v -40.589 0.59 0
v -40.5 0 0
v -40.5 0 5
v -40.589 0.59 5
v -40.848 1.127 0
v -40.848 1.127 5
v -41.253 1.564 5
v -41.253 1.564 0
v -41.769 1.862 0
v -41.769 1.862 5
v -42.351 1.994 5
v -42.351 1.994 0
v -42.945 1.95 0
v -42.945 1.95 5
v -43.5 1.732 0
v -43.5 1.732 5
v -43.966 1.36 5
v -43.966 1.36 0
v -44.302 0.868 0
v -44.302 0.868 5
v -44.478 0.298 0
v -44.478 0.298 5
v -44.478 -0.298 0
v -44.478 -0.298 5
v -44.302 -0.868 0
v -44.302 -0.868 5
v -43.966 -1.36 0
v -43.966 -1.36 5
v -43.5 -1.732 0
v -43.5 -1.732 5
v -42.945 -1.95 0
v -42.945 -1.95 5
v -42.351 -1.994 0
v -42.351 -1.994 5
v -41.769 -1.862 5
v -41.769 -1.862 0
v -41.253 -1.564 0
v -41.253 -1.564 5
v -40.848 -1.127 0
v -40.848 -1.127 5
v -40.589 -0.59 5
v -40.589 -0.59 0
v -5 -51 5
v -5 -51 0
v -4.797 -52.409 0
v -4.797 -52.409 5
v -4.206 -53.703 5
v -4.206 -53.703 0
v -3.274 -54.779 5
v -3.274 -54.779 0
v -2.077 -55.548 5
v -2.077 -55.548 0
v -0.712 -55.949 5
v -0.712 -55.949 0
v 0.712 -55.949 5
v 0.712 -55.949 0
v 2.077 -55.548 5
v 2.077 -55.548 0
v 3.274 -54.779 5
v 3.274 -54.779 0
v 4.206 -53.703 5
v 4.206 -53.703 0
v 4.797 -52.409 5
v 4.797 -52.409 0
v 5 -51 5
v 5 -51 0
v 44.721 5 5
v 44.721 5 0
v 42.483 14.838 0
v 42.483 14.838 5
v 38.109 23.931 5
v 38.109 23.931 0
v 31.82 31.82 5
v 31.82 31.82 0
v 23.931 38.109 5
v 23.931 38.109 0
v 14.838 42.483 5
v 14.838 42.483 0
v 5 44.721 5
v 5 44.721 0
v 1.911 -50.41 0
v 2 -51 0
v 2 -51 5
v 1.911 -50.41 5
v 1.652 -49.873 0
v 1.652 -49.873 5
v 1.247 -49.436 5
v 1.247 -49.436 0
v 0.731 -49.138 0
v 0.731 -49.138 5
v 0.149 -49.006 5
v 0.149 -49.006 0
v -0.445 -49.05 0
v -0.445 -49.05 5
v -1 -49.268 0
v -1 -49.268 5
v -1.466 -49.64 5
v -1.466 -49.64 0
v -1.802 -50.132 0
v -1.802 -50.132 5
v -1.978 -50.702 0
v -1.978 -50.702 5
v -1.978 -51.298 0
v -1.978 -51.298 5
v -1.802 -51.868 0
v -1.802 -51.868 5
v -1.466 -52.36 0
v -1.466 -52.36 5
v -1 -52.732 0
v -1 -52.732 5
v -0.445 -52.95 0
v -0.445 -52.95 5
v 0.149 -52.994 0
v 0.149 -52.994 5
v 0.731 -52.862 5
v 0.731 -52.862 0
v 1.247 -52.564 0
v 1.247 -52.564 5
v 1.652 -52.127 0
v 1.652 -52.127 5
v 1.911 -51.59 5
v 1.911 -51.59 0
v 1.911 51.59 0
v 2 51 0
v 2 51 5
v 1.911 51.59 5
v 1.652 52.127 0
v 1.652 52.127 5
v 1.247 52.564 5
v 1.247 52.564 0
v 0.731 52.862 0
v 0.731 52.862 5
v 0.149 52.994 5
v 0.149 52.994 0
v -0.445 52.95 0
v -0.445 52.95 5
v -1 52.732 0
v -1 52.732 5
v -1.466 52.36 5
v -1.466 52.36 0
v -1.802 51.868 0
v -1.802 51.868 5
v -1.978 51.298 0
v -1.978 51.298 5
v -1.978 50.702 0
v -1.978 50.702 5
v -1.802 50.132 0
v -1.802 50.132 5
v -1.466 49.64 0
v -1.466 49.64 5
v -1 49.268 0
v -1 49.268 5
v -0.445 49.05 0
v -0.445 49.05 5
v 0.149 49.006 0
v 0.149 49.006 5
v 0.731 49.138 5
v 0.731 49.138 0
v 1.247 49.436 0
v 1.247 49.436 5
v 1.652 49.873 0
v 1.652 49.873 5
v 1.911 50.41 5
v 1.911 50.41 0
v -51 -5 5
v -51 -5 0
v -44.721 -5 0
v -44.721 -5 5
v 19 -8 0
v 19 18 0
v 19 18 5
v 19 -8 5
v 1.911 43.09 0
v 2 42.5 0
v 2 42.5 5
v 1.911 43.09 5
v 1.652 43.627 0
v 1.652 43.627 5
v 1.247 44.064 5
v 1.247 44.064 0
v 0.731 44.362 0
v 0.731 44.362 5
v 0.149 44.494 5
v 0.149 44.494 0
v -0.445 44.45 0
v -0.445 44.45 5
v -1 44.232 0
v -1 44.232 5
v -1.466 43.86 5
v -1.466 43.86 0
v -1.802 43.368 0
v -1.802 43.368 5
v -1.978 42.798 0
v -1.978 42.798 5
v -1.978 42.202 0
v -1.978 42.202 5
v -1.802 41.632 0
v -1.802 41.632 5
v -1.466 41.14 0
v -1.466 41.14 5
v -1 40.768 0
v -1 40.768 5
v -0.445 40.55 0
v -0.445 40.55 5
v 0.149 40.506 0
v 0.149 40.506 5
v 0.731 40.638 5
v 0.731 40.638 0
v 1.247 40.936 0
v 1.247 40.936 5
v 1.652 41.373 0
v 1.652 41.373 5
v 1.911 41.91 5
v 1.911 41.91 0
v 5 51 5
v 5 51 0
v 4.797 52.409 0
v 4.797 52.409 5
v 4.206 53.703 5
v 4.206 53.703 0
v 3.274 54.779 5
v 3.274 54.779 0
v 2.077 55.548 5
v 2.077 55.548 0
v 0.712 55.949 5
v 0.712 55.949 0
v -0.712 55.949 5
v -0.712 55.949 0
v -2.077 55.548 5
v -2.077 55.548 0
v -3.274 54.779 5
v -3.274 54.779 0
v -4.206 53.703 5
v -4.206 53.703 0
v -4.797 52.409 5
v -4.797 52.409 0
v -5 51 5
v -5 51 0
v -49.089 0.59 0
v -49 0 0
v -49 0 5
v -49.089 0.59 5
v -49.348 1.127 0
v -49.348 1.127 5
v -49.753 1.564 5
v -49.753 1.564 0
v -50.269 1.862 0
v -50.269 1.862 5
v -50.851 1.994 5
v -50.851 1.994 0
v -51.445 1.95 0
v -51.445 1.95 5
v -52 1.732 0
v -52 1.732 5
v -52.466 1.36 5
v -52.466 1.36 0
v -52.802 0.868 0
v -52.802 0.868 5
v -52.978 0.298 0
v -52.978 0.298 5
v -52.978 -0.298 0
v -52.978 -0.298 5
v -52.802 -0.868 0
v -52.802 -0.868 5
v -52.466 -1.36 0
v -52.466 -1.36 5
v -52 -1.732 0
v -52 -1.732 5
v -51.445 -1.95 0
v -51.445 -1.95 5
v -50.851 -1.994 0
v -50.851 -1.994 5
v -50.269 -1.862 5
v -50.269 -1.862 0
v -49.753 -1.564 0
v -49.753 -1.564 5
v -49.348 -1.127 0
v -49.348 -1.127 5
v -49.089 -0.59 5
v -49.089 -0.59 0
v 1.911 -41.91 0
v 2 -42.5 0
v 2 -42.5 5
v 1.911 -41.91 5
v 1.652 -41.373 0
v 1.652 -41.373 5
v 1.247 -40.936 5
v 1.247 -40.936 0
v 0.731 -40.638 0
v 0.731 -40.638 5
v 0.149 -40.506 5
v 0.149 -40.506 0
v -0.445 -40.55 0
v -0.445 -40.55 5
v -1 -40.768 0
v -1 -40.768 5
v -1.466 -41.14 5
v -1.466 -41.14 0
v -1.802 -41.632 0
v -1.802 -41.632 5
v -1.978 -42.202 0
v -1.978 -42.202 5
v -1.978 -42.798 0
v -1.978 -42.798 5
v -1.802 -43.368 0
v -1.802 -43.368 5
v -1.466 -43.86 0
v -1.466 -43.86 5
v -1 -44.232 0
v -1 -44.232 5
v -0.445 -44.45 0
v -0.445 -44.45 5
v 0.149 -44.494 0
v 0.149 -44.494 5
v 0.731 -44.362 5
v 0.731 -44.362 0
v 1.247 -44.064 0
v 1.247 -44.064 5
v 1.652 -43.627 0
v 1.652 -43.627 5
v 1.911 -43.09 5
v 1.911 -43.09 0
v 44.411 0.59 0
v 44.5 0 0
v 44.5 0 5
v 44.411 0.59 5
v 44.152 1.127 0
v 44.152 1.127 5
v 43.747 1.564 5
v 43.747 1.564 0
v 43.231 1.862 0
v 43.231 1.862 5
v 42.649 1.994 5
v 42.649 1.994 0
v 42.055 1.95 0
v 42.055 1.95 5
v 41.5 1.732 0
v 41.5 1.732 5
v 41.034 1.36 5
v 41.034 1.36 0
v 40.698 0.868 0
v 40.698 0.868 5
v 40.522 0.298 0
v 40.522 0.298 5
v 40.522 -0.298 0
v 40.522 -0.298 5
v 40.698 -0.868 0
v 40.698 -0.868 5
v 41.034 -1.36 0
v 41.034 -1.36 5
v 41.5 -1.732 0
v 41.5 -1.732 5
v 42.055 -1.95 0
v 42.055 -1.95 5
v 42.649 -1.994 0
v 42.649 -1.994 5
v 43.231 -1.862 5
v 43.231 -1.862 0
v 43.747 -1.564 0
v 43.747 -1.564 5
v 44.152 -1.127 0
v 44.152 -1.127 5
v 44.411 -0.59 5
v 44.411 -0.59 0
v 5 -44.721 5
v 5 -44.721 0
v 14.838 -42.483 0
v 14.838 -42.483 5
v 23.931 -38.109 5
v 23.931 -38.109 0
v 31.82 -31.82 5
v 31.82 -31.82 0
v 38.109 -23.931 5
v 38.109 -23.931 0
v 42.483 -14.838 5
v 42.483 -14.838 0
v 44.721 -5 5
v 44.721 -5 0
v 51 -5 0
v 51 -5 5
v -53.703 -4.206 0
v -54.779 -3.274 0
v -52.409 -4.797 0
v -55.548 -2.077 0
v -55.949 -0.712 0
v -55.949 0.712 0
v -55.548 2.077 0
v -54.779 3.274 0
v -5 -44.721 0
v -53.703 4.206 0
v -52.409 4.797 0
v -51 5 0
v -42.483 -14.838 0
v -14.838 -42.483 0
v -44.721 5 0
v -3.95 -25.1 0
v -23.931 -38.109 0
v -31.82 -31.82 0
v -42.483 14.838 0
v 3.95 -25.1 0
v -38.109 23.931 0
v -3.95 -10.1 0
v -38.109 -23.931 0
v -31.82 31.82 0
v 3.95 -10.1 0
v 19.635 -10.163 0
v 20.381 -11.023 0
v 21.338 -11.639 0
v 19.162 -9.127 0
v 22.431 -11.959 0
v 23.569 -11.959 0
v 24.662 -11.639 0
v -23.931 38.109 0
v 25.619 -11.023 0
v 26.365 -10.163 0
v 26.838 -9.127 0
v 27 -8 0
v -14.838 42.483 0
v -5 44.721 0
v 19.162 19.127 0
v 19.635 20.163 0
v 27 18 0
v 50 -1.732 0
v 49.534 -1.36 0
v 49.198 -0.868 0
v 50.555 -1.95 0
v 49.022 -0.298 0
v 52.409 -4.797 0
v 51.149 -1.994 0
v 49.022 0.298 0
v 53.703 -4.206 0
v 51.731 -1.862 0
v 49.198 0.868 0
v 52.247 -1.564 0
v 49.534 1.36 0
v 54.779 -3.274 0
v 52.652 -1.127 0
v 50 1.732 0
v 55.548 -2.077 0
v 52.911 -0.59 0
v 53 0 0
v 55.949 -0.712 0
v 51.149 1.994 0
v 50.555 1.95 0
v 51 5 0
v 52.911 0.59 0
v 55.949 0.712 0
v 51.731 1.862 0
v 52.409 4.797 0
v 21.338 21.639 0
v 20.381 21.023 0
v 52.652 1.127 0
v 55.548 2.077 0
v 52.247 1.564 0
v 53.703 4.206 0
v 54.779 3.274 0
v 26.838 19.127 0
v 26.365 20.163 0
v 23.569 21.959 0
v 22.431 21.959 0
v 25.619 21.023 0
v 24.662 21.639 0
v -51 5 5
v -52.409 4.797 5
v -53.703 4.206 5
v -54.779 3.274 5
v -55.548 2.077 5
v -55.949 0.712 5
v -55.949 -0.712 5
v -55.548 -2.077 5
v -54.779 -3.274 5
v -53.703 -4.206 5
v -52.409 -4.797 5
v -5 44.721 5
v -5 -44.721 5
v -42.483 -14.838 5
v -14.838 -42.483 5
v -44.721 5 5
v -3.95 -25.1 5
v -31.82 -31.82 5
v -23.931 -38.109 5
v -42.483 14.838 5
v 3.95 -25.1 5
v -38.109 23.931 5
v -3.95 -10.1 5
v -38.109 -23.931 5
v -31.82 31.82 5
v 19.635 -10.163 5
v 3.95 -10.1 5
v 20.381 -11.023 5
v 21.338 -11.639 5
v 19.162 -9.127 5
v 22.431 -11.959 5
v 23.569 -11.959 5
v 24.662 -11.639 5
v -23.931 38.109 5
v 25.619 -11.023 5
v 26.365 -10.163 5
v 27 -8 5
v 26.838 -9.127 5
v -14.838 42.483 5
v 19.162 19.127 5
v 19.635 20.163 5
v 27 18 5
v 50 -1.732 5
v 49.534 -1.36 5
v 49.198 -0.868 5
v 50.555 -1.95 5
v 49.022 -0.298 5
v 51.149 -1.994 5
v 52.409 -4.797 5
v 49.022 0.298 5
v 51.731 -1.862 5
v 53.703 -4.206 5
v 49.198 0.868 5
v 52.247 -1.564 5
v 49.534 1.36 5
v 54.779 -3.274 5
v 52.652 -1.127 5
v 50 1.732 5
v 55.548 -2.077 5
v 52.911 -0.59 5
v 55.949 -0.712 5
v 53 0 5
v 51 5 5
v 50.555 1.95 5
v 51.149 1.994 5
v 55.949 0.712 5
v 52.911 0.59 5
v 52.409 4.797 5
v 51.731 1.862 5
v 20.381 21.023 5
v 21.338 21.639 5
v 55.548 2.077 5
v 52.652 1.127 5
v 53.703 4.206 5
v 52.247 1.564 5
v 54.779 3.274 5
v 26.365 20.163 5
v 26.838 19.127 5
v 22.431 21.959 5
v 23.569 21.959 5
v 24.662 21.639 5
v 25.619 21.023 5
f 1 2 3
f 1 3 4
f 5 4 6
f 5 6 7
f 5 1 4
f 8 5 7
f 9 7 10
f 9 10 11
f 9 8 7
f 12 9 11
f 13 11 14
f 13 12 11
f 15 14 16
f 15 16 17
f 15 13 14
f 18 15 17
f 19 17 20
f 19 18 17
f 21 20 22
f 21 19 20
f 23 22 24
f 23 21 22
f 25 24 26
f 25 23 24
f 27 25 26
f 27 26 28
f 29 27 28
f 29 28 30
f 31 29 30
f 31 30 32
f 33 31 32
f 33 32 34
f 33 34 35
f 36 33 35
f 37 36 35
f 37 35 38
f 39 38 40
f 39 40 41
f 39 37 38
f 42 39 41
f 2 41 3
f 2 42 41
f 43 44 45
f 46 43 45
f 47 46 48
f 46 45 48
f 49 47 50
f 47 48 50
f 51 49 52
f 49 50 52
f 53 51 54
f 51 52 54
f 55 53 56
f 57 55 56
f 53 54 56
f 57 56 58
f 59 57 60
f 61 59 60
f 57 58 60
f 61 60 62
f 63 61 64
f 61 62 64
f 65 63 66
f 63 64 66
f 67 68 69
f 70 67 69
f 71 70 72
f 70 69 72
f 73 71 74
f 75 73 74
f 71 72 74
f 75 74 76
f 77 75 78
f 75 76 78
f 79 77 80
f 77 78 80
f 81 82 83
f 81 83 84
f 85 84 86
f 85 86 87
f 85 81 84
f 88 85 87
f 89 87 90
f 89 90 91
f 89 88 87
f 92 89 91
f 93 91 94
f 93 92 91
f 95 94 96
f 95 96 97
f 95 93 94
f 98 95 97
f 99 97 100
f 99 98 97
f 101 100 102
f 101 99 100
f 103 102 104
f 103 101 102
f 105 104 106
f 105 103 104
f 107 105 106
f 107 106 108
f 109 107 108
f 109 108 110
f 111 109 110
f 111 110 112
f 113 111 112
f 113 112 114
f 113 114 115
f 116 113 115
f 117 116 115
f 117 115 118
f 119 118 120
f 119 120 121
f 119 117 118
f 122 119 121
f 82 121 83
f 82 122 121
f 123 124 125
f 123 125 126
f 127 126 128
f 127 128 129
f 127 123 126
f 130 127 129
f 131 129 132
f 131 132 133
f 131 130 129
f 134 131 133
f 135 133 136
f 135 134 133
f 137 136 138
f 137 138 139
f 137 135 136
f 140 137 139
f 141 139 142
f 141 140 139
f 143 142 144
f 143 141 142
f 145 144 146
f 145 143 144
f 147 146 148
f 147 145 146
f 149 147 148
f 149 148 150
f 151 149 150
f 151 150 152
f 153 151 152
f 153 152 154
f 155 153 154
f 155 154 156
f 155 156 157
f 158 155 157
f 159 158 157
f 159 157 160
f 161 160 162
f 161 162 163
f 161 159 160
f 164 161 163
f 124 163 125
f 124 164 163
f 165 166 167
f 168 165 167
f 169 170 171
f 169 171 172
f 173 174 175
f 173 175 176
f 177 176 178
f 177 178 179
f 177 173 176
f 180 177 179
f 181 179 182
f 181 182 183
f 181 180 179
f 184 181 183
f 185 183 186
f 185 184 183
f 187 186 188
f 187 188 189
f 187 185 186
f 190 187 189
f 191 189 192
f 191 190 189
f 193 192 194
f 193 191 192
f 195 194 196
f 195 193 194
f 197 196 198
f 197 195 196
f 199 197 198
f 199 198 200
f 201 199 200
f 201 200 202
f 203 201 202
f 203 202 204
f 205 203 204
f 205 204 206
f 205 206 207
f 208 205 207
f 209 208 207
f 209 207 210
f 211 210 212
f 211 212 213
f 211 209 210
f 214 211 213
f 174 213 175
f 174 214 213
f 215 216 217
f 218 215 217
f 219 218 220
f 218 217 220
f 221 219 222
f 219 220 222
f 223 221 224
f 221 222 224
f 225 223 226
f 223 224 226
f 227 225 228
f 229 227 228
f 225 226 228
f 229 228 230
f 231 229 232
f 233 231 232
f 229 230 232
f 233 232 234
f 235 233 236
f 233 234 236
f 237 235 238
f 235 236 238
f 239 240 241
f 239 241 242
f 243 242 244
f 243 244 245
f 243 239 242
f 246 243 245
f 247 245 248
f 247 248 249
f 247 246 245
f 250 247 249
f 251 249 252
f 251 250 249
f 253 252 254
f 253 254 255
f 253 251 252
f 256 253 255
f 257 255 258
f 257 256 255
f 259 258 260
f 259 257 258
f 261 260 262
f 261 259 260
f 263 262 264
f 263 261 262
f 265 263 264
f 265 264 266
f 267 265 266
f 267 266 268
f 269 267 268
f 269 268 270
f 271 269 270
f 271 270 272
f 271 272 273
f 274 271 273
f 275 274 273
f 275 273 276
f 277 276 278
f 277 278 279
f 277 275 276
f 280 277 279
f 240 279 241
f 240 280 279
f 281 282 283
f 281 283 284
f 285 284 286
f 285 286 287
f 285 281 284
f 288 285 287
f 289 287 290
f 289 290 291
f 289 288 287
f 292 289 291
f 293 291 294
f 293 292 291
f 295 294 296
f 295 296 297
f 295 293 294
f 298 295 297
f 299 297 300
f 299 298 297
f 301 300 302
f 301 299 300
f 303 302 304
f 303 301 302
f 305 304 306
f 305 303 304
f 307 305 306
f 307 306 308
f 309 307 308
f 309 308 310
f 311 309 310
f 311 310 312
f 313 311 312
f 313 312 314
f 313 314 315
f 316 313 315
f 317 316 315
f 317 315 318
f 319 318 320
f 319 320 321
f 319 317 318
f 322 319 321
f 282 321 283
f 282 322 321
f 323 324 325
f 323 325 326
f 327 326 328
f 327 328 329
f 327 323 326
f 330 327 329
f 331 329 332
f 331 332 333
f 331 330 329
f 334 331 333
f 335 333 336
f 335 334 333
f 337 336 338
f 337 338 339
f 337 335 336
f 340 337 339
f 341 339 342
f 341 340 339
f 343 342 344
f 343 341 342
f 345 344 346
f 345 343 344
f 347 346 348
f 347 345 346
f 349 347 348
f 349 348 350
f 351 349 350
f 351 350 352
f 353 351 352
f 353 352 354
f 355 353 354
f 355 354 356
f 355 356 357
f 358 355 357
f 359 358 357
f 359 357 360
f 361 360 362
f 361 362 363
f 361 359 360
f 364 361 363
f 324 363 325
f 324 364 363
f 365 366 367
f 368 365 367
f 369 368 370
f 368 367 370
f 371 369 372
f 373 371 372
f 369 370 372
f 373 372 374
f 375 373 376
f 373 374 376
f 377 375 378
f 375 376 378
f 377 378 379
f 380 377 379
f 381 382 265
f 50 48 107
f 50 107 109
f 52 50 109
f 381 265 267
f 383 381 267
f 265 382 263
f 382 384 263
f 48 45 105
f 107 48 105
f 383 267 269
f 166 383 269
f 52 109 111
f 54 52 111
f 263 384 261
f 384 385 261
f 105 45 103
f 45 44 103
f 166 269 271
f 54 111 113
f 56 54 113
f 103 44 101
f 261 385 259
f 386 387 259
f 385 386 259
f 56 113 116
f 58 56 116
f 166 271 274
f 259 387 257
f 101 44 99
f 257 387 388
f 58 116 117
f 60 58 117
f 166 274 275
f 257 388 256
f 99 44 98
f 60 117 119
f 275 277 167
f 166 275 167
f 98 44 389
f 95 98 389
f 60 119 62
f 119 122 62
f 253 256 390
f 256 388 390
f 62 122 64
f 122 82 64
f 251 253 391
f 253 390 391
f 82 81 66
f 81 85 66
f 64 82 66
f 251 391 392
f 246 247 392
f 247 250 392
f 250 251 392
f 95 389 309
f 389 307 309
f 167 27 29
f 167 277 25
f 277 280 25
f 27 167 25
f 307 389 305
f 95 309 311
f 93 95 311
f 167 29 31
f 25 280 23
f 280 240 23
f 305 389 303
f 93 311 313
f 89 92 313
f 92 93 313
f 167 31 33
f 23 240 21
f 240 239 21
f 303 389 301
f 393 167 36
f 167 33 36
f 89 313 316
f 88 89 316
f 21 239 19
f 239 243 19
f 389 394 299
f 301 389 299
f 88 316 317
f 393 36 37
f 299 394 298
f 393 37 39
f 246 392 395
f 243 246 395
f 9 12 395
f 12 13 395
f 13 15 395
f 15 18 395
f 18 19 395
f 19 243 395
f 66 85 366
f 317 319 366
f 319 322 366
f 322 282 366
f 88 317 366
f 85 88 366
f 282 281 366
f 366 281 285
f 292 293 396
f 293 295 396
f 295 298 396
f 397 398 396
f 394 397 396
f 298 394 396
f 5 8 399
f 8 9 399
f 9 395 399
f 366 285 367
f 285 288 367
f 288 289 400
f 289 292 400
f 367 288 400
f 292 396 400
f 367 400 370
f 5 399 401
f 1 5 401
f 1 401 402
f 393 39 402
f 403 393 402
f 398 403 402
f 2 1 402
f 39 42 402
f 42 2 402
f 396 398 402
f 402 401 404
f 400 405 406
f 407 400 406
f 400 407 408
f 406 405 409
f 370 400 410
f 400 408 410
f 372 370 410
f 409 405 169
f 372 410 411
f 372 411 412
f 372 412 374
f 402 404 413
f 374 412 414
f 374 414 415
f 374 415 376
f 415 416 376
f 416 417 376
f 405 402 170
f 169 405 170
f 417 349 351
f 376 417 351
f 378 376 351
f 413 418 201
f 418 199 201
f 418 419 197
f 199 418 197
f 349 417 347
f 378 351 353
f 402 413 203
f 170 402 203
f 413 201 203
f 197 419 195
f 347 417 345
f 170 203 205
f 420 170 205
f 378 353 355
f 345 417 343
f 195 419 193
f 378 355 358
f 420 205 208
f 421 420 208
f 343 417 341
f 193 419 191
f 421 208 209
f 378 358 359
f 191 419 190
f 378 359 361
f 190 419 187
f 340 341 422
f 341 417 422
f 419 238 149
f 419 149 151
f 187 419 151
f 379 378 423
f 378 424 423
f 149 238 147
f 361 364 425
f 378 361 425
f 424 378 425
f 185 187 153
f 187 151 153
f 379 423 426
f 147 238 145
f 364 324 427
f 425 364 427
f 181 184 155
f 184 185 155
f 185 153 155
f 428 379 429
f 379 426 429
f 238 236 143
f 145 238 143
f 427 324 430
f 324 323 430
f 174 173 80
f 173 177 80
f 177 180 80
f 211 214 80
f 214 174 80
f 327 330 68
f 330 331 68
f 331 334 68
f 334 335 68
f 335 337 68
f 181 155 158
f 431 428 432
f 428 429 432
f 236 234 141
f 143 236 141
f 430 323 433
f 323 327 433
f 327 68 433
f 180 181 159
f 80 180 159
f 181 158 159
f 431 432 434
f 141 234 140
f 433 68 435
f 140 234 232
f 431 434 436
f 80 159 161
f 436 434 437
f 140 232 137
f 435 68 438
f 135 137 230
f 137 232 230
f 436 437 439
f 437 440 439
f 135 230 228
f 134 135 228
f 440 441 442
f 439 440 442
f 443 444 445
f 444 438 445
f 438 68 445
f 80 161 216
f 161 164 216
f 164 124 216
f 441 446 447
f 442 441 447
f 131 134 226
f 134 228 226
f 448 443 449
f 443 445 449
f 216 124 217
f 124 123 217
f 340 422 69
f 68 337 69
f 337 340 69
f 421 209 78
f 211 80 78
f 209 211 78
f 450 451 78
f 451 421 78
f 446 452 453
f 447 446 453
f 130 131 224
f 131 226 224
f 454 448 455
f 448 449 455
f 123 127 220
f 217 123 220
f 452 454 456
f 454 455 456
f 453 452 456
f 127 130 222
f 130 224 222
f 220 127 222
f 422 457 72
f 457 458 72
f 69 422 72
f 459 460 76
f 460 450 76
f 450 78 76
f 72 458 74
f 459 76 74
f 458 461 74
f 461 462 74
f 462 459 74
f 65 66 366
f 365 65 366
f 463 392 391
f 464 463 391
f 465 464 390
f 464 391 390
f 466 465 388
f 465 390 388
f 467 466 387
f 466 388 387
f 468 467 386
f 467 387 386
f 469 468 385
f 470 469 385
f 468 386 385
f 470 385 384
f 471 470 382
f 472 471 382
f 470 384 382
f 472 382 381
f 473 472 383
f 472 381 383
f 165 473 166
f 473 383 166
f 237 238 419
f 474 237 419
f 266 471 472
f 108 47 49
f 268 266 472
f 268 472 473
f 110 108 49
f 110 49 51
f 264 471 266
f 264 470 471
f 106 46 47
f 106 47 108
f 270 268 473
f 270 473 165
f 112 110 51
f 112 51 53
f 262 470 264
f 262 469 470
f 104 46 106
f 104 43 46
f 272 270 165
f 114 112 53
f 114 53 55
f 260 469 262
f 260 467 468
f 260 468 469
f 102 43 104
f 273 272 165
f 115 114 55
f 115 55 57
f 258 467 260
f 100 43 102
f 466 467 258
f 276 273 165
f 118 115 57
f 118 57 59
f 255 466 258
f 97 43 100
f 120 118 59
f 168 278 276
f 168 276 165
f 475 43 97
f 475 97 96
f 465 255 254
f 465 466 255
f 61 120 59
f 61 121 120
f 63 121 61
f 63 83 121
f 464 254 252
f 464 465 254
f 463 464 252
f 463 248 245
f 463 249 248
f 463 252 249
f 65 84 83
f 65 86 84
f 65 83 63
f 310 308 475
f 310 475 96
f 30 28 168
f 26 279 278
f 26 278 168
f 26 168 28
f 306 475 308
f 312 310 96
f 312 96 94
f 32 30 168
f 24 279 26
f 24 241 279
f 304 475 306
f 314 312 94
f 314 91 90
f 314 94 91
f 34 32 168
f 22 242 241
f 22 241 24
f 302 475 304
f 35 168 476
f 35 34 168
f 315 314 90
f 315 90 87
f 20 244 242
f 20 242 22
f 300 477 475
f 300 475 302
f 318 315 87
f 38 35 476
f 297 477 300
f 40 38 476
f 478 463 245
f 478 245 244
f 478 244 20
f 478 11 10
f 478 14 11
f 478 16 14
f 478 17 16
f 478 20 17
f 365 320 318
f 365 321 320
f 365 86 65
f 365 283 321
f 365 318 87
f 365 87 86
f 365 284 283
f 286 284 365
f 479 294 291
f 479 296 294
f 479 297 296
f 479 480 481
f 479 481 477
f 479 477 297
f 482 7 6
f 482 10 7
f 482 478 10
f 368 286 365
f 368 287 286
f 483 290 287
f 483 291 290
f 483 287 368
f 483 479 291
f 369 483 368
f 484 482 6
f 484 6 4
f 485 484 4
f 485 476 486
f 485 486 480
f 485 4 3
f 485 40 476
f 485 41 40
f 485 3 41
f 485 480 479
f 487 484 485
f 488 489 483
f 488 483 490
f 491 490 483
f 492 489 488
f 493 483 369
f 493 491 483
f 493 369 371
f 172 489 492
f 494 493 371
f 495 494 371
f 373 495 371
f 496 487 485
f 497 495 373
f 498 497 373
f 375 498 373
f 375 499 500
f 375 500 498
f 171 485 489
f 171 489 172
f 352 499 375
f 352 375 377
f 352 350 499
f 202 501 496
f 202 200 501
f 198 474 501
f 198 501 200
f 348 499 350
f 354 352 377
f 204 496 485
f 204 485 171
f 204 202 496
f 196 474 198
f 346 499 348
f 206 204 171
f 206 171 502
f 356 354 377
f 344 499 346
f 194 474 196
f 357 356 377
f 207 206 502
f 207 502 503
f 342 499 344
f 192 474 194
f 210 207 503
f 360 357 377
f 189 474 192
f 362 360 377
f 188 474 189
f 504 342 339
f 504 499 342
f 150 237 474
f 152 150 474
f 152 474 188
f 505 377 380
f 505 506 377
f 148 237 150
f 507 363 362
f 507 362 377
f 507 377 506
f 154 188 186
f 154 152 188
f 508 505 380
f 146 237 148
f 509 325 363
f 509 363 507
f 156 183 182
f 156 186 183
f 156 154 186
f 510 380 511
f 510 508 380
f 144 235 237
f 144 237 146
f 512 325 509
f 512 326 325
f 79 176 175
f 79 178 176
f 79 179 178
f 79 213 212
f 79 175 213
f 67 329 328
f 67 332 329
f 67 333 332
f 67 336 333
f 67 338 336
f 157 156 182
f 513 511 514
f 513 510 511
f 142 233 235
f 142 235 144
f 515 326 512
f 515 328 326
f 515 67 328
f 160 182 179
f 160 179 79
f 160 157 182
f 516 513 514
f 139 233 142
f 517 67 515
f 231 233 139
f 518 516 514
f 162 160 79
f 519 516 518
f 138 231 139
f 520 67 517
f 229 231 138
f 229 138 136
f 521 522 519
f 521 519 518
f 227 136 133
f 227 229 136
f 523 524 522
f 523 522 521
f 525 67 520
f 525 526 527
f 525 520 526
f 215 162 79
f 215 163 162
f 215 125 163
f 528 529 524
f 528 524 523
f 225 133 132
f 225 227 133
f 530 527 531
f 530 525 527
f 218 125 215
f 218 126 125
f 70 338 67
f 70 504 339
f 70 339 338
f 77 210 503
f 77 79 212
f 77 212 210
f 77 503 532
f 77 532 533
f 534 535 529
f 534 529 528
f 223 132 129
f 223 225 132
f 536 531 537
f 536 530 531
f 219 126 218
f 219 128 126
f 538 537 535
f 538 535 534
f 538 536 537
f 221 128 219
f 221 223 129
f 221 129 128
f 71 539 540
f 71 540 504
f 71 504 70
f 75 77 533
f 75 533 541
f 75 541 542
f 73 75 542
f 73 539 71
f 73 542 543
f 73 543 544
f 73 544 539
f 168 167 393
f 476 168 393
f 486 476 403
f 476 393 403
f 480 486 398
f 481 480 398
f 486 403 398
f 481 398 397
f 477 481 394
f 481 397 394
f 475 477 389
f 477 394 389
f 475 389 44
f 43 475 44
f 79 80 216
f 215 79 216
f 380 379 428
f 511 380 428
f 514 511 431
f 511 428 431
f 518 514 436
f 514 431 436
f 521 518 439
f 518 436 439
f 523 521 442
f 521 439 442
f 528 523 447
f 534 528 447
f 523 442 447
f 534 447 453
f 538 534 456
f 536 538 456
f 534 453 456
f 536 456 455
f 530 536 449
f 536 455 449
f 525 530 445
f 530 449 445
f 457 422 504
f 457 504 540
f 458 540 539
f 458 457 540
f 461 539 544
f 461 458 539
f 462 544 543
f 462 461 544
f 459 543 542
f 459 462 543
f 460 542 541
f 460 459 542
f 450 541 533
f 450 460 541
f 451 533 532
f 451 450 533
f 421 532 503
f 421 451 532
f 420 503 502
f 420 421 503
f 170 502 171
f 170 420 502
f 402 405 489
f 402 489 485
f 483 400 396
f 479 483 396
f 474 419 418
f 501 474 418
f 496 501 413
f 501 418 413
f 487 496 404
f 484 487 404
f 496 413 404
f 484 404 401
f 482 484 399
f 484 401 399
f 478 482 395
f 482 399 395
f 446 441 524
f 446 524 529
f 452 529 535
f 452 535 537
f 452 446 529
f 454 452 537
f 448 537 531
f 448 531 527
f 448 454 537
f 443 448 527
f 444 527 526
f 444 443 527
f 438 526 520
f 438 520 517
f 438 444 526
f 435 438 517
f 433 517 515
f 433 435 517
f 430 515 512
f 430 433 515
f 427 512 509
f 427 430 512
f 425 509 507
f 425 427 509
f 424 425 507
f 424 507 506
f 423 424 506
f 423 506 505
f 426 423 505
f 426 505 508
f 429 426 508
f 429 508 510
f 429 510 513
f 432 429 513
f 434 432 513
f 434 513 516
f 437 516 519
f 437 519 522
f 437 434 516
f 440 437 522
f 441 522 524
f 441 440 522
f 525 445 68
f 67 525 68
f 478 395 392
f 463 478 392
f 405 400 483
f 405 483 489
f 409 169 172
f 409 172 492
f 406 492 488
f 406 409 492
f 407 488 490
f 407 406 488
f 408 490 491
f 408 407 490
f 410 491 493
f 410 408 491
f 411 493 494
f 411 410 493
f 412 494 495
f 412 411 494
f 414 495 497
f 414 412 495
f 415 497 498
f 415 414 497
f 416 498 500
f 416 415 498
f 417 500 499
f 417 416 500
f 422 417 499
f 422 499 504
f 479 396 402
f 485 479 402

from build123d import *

# Parameters (mm, degrees)
SKETCH1_R           = 2
BOSS_EXTRUDE1_DEPTH = 5
SKETCH2_W           = 7.9
SKETCH2_H           = 15
CUT_EXTRUDE1_DEPTH  = 10
CUT_EXTRUDE2_DEPTH  = 10


with BuildPart() as part:
    # Sketch1 → Boss-Extrude1 (new body)
    with BuildSketch(Plane.XY):
        with BuildLine():
            ThreePointArc((5, 51), (0, 56), (-5, 51))
            Line((-5, 51), (-5, 44.72135955))
            ThreePointArc((-5, 44.72135955), (-31.819805153, 31.819805153), (-44.72135955, 5))
            Line((-44.72135955, 5), (-51, 5))
            ThreePointArc((-51, 5), (-56, 0), (-51, -5))
            Line((-51, -5), (-44.72135955, -5))
            ThreePointArc((-44.72135955, -5), (-31.819805153, -31.819805153), (-5, -44.72135955))
            Line((-5, -44.72135955), (-5, -51))
            ThreePointArc((-5, -51), (0, -56), (5, -51))
            Line((5, -51), (5, -44.72135955))
            ThreePointArc((5, -44.72135955), (31.819805153, -31.819805153), (44.72135955, -5))
            Line((44.72135955, -5), (51, -5))
            ThreePointArc((51, -5), (56, 0), (51, 5))
            Line((51, 5), (44.72135955, 5))
            ThreePointArc((44.72135955, 5), (31.819805153, 31.819805153), (5, 44.72135955))
            Line((5, 44.72135955), (5, 51))
        make_face()
        with Locations((0, 51)):
            Circle(SKETCH1_R, mode=Mode.SUBTRACT)
        with Locations((0, 42.5)):
            Circle(SKETCH1_R, mode=Mode.SUBTRACT)
        with Locations((0, -42.5)):
            Circle(SKETCH1_R, mode=Mode.SUBTRACT)
        with Locations((-42.5, 0)):
            Circle(SKETCH1_R, mode=Mode.SUBTRACT)
        with Locations((42.5, 0)):
            Circle(SKETCH1_R, mode=Mode.SUBTRACT)
        with Locations((-51, 0)):
            Circle(SKETCH1_R, mode=Mode.SUBTRACT)
        with Locations((51, 0)):
            Circle(SKETCH1_R, mode=Mode.SUBTRACT)
        with Locations((0, -51)):
            Circle(SKETCH1_R, mode=Mode.SUBTRACT)
    extrude(amount=BOSS_EXTRUDE1_DEPTH)

    # Sketch2 → Cut-Extrude1 (cut)
    with BuildSketch(Plane(origin=(0, 0, 0), x_dir=(-1, 0, 0), z_dir=(0, 0, -1))):
        with Locations((0, -17.6)):
            Rectangle(SKETCH2_W, SKETCH2_H)
    extrude(amount=-CUT_EXTRUDE1_DEPTH, mode=Mode.SUBTRACT)

    # Sketch3 → Cut-Extrude2 (cut)
    with BuildSketch(Plane(origin=(0, 0, 0), x_dir=(-1, 0, 0), z_dir=(0, 0, -1))):
        with BuildLine():
            Line((-19, 18), (-19, -8))
            ThreePointArc((-19, -8), (-23, -12), (-27, -8))
            Line((-27, -8), (-27, 18))
            ThreePointArc((-27, 18), (-23, 22), (-19, 18))
        make_face()
    extrude(amount=-CUT_EXTRUDE2_DEPTH, mode=Mode.SUBTRACT)


solid = part.part
